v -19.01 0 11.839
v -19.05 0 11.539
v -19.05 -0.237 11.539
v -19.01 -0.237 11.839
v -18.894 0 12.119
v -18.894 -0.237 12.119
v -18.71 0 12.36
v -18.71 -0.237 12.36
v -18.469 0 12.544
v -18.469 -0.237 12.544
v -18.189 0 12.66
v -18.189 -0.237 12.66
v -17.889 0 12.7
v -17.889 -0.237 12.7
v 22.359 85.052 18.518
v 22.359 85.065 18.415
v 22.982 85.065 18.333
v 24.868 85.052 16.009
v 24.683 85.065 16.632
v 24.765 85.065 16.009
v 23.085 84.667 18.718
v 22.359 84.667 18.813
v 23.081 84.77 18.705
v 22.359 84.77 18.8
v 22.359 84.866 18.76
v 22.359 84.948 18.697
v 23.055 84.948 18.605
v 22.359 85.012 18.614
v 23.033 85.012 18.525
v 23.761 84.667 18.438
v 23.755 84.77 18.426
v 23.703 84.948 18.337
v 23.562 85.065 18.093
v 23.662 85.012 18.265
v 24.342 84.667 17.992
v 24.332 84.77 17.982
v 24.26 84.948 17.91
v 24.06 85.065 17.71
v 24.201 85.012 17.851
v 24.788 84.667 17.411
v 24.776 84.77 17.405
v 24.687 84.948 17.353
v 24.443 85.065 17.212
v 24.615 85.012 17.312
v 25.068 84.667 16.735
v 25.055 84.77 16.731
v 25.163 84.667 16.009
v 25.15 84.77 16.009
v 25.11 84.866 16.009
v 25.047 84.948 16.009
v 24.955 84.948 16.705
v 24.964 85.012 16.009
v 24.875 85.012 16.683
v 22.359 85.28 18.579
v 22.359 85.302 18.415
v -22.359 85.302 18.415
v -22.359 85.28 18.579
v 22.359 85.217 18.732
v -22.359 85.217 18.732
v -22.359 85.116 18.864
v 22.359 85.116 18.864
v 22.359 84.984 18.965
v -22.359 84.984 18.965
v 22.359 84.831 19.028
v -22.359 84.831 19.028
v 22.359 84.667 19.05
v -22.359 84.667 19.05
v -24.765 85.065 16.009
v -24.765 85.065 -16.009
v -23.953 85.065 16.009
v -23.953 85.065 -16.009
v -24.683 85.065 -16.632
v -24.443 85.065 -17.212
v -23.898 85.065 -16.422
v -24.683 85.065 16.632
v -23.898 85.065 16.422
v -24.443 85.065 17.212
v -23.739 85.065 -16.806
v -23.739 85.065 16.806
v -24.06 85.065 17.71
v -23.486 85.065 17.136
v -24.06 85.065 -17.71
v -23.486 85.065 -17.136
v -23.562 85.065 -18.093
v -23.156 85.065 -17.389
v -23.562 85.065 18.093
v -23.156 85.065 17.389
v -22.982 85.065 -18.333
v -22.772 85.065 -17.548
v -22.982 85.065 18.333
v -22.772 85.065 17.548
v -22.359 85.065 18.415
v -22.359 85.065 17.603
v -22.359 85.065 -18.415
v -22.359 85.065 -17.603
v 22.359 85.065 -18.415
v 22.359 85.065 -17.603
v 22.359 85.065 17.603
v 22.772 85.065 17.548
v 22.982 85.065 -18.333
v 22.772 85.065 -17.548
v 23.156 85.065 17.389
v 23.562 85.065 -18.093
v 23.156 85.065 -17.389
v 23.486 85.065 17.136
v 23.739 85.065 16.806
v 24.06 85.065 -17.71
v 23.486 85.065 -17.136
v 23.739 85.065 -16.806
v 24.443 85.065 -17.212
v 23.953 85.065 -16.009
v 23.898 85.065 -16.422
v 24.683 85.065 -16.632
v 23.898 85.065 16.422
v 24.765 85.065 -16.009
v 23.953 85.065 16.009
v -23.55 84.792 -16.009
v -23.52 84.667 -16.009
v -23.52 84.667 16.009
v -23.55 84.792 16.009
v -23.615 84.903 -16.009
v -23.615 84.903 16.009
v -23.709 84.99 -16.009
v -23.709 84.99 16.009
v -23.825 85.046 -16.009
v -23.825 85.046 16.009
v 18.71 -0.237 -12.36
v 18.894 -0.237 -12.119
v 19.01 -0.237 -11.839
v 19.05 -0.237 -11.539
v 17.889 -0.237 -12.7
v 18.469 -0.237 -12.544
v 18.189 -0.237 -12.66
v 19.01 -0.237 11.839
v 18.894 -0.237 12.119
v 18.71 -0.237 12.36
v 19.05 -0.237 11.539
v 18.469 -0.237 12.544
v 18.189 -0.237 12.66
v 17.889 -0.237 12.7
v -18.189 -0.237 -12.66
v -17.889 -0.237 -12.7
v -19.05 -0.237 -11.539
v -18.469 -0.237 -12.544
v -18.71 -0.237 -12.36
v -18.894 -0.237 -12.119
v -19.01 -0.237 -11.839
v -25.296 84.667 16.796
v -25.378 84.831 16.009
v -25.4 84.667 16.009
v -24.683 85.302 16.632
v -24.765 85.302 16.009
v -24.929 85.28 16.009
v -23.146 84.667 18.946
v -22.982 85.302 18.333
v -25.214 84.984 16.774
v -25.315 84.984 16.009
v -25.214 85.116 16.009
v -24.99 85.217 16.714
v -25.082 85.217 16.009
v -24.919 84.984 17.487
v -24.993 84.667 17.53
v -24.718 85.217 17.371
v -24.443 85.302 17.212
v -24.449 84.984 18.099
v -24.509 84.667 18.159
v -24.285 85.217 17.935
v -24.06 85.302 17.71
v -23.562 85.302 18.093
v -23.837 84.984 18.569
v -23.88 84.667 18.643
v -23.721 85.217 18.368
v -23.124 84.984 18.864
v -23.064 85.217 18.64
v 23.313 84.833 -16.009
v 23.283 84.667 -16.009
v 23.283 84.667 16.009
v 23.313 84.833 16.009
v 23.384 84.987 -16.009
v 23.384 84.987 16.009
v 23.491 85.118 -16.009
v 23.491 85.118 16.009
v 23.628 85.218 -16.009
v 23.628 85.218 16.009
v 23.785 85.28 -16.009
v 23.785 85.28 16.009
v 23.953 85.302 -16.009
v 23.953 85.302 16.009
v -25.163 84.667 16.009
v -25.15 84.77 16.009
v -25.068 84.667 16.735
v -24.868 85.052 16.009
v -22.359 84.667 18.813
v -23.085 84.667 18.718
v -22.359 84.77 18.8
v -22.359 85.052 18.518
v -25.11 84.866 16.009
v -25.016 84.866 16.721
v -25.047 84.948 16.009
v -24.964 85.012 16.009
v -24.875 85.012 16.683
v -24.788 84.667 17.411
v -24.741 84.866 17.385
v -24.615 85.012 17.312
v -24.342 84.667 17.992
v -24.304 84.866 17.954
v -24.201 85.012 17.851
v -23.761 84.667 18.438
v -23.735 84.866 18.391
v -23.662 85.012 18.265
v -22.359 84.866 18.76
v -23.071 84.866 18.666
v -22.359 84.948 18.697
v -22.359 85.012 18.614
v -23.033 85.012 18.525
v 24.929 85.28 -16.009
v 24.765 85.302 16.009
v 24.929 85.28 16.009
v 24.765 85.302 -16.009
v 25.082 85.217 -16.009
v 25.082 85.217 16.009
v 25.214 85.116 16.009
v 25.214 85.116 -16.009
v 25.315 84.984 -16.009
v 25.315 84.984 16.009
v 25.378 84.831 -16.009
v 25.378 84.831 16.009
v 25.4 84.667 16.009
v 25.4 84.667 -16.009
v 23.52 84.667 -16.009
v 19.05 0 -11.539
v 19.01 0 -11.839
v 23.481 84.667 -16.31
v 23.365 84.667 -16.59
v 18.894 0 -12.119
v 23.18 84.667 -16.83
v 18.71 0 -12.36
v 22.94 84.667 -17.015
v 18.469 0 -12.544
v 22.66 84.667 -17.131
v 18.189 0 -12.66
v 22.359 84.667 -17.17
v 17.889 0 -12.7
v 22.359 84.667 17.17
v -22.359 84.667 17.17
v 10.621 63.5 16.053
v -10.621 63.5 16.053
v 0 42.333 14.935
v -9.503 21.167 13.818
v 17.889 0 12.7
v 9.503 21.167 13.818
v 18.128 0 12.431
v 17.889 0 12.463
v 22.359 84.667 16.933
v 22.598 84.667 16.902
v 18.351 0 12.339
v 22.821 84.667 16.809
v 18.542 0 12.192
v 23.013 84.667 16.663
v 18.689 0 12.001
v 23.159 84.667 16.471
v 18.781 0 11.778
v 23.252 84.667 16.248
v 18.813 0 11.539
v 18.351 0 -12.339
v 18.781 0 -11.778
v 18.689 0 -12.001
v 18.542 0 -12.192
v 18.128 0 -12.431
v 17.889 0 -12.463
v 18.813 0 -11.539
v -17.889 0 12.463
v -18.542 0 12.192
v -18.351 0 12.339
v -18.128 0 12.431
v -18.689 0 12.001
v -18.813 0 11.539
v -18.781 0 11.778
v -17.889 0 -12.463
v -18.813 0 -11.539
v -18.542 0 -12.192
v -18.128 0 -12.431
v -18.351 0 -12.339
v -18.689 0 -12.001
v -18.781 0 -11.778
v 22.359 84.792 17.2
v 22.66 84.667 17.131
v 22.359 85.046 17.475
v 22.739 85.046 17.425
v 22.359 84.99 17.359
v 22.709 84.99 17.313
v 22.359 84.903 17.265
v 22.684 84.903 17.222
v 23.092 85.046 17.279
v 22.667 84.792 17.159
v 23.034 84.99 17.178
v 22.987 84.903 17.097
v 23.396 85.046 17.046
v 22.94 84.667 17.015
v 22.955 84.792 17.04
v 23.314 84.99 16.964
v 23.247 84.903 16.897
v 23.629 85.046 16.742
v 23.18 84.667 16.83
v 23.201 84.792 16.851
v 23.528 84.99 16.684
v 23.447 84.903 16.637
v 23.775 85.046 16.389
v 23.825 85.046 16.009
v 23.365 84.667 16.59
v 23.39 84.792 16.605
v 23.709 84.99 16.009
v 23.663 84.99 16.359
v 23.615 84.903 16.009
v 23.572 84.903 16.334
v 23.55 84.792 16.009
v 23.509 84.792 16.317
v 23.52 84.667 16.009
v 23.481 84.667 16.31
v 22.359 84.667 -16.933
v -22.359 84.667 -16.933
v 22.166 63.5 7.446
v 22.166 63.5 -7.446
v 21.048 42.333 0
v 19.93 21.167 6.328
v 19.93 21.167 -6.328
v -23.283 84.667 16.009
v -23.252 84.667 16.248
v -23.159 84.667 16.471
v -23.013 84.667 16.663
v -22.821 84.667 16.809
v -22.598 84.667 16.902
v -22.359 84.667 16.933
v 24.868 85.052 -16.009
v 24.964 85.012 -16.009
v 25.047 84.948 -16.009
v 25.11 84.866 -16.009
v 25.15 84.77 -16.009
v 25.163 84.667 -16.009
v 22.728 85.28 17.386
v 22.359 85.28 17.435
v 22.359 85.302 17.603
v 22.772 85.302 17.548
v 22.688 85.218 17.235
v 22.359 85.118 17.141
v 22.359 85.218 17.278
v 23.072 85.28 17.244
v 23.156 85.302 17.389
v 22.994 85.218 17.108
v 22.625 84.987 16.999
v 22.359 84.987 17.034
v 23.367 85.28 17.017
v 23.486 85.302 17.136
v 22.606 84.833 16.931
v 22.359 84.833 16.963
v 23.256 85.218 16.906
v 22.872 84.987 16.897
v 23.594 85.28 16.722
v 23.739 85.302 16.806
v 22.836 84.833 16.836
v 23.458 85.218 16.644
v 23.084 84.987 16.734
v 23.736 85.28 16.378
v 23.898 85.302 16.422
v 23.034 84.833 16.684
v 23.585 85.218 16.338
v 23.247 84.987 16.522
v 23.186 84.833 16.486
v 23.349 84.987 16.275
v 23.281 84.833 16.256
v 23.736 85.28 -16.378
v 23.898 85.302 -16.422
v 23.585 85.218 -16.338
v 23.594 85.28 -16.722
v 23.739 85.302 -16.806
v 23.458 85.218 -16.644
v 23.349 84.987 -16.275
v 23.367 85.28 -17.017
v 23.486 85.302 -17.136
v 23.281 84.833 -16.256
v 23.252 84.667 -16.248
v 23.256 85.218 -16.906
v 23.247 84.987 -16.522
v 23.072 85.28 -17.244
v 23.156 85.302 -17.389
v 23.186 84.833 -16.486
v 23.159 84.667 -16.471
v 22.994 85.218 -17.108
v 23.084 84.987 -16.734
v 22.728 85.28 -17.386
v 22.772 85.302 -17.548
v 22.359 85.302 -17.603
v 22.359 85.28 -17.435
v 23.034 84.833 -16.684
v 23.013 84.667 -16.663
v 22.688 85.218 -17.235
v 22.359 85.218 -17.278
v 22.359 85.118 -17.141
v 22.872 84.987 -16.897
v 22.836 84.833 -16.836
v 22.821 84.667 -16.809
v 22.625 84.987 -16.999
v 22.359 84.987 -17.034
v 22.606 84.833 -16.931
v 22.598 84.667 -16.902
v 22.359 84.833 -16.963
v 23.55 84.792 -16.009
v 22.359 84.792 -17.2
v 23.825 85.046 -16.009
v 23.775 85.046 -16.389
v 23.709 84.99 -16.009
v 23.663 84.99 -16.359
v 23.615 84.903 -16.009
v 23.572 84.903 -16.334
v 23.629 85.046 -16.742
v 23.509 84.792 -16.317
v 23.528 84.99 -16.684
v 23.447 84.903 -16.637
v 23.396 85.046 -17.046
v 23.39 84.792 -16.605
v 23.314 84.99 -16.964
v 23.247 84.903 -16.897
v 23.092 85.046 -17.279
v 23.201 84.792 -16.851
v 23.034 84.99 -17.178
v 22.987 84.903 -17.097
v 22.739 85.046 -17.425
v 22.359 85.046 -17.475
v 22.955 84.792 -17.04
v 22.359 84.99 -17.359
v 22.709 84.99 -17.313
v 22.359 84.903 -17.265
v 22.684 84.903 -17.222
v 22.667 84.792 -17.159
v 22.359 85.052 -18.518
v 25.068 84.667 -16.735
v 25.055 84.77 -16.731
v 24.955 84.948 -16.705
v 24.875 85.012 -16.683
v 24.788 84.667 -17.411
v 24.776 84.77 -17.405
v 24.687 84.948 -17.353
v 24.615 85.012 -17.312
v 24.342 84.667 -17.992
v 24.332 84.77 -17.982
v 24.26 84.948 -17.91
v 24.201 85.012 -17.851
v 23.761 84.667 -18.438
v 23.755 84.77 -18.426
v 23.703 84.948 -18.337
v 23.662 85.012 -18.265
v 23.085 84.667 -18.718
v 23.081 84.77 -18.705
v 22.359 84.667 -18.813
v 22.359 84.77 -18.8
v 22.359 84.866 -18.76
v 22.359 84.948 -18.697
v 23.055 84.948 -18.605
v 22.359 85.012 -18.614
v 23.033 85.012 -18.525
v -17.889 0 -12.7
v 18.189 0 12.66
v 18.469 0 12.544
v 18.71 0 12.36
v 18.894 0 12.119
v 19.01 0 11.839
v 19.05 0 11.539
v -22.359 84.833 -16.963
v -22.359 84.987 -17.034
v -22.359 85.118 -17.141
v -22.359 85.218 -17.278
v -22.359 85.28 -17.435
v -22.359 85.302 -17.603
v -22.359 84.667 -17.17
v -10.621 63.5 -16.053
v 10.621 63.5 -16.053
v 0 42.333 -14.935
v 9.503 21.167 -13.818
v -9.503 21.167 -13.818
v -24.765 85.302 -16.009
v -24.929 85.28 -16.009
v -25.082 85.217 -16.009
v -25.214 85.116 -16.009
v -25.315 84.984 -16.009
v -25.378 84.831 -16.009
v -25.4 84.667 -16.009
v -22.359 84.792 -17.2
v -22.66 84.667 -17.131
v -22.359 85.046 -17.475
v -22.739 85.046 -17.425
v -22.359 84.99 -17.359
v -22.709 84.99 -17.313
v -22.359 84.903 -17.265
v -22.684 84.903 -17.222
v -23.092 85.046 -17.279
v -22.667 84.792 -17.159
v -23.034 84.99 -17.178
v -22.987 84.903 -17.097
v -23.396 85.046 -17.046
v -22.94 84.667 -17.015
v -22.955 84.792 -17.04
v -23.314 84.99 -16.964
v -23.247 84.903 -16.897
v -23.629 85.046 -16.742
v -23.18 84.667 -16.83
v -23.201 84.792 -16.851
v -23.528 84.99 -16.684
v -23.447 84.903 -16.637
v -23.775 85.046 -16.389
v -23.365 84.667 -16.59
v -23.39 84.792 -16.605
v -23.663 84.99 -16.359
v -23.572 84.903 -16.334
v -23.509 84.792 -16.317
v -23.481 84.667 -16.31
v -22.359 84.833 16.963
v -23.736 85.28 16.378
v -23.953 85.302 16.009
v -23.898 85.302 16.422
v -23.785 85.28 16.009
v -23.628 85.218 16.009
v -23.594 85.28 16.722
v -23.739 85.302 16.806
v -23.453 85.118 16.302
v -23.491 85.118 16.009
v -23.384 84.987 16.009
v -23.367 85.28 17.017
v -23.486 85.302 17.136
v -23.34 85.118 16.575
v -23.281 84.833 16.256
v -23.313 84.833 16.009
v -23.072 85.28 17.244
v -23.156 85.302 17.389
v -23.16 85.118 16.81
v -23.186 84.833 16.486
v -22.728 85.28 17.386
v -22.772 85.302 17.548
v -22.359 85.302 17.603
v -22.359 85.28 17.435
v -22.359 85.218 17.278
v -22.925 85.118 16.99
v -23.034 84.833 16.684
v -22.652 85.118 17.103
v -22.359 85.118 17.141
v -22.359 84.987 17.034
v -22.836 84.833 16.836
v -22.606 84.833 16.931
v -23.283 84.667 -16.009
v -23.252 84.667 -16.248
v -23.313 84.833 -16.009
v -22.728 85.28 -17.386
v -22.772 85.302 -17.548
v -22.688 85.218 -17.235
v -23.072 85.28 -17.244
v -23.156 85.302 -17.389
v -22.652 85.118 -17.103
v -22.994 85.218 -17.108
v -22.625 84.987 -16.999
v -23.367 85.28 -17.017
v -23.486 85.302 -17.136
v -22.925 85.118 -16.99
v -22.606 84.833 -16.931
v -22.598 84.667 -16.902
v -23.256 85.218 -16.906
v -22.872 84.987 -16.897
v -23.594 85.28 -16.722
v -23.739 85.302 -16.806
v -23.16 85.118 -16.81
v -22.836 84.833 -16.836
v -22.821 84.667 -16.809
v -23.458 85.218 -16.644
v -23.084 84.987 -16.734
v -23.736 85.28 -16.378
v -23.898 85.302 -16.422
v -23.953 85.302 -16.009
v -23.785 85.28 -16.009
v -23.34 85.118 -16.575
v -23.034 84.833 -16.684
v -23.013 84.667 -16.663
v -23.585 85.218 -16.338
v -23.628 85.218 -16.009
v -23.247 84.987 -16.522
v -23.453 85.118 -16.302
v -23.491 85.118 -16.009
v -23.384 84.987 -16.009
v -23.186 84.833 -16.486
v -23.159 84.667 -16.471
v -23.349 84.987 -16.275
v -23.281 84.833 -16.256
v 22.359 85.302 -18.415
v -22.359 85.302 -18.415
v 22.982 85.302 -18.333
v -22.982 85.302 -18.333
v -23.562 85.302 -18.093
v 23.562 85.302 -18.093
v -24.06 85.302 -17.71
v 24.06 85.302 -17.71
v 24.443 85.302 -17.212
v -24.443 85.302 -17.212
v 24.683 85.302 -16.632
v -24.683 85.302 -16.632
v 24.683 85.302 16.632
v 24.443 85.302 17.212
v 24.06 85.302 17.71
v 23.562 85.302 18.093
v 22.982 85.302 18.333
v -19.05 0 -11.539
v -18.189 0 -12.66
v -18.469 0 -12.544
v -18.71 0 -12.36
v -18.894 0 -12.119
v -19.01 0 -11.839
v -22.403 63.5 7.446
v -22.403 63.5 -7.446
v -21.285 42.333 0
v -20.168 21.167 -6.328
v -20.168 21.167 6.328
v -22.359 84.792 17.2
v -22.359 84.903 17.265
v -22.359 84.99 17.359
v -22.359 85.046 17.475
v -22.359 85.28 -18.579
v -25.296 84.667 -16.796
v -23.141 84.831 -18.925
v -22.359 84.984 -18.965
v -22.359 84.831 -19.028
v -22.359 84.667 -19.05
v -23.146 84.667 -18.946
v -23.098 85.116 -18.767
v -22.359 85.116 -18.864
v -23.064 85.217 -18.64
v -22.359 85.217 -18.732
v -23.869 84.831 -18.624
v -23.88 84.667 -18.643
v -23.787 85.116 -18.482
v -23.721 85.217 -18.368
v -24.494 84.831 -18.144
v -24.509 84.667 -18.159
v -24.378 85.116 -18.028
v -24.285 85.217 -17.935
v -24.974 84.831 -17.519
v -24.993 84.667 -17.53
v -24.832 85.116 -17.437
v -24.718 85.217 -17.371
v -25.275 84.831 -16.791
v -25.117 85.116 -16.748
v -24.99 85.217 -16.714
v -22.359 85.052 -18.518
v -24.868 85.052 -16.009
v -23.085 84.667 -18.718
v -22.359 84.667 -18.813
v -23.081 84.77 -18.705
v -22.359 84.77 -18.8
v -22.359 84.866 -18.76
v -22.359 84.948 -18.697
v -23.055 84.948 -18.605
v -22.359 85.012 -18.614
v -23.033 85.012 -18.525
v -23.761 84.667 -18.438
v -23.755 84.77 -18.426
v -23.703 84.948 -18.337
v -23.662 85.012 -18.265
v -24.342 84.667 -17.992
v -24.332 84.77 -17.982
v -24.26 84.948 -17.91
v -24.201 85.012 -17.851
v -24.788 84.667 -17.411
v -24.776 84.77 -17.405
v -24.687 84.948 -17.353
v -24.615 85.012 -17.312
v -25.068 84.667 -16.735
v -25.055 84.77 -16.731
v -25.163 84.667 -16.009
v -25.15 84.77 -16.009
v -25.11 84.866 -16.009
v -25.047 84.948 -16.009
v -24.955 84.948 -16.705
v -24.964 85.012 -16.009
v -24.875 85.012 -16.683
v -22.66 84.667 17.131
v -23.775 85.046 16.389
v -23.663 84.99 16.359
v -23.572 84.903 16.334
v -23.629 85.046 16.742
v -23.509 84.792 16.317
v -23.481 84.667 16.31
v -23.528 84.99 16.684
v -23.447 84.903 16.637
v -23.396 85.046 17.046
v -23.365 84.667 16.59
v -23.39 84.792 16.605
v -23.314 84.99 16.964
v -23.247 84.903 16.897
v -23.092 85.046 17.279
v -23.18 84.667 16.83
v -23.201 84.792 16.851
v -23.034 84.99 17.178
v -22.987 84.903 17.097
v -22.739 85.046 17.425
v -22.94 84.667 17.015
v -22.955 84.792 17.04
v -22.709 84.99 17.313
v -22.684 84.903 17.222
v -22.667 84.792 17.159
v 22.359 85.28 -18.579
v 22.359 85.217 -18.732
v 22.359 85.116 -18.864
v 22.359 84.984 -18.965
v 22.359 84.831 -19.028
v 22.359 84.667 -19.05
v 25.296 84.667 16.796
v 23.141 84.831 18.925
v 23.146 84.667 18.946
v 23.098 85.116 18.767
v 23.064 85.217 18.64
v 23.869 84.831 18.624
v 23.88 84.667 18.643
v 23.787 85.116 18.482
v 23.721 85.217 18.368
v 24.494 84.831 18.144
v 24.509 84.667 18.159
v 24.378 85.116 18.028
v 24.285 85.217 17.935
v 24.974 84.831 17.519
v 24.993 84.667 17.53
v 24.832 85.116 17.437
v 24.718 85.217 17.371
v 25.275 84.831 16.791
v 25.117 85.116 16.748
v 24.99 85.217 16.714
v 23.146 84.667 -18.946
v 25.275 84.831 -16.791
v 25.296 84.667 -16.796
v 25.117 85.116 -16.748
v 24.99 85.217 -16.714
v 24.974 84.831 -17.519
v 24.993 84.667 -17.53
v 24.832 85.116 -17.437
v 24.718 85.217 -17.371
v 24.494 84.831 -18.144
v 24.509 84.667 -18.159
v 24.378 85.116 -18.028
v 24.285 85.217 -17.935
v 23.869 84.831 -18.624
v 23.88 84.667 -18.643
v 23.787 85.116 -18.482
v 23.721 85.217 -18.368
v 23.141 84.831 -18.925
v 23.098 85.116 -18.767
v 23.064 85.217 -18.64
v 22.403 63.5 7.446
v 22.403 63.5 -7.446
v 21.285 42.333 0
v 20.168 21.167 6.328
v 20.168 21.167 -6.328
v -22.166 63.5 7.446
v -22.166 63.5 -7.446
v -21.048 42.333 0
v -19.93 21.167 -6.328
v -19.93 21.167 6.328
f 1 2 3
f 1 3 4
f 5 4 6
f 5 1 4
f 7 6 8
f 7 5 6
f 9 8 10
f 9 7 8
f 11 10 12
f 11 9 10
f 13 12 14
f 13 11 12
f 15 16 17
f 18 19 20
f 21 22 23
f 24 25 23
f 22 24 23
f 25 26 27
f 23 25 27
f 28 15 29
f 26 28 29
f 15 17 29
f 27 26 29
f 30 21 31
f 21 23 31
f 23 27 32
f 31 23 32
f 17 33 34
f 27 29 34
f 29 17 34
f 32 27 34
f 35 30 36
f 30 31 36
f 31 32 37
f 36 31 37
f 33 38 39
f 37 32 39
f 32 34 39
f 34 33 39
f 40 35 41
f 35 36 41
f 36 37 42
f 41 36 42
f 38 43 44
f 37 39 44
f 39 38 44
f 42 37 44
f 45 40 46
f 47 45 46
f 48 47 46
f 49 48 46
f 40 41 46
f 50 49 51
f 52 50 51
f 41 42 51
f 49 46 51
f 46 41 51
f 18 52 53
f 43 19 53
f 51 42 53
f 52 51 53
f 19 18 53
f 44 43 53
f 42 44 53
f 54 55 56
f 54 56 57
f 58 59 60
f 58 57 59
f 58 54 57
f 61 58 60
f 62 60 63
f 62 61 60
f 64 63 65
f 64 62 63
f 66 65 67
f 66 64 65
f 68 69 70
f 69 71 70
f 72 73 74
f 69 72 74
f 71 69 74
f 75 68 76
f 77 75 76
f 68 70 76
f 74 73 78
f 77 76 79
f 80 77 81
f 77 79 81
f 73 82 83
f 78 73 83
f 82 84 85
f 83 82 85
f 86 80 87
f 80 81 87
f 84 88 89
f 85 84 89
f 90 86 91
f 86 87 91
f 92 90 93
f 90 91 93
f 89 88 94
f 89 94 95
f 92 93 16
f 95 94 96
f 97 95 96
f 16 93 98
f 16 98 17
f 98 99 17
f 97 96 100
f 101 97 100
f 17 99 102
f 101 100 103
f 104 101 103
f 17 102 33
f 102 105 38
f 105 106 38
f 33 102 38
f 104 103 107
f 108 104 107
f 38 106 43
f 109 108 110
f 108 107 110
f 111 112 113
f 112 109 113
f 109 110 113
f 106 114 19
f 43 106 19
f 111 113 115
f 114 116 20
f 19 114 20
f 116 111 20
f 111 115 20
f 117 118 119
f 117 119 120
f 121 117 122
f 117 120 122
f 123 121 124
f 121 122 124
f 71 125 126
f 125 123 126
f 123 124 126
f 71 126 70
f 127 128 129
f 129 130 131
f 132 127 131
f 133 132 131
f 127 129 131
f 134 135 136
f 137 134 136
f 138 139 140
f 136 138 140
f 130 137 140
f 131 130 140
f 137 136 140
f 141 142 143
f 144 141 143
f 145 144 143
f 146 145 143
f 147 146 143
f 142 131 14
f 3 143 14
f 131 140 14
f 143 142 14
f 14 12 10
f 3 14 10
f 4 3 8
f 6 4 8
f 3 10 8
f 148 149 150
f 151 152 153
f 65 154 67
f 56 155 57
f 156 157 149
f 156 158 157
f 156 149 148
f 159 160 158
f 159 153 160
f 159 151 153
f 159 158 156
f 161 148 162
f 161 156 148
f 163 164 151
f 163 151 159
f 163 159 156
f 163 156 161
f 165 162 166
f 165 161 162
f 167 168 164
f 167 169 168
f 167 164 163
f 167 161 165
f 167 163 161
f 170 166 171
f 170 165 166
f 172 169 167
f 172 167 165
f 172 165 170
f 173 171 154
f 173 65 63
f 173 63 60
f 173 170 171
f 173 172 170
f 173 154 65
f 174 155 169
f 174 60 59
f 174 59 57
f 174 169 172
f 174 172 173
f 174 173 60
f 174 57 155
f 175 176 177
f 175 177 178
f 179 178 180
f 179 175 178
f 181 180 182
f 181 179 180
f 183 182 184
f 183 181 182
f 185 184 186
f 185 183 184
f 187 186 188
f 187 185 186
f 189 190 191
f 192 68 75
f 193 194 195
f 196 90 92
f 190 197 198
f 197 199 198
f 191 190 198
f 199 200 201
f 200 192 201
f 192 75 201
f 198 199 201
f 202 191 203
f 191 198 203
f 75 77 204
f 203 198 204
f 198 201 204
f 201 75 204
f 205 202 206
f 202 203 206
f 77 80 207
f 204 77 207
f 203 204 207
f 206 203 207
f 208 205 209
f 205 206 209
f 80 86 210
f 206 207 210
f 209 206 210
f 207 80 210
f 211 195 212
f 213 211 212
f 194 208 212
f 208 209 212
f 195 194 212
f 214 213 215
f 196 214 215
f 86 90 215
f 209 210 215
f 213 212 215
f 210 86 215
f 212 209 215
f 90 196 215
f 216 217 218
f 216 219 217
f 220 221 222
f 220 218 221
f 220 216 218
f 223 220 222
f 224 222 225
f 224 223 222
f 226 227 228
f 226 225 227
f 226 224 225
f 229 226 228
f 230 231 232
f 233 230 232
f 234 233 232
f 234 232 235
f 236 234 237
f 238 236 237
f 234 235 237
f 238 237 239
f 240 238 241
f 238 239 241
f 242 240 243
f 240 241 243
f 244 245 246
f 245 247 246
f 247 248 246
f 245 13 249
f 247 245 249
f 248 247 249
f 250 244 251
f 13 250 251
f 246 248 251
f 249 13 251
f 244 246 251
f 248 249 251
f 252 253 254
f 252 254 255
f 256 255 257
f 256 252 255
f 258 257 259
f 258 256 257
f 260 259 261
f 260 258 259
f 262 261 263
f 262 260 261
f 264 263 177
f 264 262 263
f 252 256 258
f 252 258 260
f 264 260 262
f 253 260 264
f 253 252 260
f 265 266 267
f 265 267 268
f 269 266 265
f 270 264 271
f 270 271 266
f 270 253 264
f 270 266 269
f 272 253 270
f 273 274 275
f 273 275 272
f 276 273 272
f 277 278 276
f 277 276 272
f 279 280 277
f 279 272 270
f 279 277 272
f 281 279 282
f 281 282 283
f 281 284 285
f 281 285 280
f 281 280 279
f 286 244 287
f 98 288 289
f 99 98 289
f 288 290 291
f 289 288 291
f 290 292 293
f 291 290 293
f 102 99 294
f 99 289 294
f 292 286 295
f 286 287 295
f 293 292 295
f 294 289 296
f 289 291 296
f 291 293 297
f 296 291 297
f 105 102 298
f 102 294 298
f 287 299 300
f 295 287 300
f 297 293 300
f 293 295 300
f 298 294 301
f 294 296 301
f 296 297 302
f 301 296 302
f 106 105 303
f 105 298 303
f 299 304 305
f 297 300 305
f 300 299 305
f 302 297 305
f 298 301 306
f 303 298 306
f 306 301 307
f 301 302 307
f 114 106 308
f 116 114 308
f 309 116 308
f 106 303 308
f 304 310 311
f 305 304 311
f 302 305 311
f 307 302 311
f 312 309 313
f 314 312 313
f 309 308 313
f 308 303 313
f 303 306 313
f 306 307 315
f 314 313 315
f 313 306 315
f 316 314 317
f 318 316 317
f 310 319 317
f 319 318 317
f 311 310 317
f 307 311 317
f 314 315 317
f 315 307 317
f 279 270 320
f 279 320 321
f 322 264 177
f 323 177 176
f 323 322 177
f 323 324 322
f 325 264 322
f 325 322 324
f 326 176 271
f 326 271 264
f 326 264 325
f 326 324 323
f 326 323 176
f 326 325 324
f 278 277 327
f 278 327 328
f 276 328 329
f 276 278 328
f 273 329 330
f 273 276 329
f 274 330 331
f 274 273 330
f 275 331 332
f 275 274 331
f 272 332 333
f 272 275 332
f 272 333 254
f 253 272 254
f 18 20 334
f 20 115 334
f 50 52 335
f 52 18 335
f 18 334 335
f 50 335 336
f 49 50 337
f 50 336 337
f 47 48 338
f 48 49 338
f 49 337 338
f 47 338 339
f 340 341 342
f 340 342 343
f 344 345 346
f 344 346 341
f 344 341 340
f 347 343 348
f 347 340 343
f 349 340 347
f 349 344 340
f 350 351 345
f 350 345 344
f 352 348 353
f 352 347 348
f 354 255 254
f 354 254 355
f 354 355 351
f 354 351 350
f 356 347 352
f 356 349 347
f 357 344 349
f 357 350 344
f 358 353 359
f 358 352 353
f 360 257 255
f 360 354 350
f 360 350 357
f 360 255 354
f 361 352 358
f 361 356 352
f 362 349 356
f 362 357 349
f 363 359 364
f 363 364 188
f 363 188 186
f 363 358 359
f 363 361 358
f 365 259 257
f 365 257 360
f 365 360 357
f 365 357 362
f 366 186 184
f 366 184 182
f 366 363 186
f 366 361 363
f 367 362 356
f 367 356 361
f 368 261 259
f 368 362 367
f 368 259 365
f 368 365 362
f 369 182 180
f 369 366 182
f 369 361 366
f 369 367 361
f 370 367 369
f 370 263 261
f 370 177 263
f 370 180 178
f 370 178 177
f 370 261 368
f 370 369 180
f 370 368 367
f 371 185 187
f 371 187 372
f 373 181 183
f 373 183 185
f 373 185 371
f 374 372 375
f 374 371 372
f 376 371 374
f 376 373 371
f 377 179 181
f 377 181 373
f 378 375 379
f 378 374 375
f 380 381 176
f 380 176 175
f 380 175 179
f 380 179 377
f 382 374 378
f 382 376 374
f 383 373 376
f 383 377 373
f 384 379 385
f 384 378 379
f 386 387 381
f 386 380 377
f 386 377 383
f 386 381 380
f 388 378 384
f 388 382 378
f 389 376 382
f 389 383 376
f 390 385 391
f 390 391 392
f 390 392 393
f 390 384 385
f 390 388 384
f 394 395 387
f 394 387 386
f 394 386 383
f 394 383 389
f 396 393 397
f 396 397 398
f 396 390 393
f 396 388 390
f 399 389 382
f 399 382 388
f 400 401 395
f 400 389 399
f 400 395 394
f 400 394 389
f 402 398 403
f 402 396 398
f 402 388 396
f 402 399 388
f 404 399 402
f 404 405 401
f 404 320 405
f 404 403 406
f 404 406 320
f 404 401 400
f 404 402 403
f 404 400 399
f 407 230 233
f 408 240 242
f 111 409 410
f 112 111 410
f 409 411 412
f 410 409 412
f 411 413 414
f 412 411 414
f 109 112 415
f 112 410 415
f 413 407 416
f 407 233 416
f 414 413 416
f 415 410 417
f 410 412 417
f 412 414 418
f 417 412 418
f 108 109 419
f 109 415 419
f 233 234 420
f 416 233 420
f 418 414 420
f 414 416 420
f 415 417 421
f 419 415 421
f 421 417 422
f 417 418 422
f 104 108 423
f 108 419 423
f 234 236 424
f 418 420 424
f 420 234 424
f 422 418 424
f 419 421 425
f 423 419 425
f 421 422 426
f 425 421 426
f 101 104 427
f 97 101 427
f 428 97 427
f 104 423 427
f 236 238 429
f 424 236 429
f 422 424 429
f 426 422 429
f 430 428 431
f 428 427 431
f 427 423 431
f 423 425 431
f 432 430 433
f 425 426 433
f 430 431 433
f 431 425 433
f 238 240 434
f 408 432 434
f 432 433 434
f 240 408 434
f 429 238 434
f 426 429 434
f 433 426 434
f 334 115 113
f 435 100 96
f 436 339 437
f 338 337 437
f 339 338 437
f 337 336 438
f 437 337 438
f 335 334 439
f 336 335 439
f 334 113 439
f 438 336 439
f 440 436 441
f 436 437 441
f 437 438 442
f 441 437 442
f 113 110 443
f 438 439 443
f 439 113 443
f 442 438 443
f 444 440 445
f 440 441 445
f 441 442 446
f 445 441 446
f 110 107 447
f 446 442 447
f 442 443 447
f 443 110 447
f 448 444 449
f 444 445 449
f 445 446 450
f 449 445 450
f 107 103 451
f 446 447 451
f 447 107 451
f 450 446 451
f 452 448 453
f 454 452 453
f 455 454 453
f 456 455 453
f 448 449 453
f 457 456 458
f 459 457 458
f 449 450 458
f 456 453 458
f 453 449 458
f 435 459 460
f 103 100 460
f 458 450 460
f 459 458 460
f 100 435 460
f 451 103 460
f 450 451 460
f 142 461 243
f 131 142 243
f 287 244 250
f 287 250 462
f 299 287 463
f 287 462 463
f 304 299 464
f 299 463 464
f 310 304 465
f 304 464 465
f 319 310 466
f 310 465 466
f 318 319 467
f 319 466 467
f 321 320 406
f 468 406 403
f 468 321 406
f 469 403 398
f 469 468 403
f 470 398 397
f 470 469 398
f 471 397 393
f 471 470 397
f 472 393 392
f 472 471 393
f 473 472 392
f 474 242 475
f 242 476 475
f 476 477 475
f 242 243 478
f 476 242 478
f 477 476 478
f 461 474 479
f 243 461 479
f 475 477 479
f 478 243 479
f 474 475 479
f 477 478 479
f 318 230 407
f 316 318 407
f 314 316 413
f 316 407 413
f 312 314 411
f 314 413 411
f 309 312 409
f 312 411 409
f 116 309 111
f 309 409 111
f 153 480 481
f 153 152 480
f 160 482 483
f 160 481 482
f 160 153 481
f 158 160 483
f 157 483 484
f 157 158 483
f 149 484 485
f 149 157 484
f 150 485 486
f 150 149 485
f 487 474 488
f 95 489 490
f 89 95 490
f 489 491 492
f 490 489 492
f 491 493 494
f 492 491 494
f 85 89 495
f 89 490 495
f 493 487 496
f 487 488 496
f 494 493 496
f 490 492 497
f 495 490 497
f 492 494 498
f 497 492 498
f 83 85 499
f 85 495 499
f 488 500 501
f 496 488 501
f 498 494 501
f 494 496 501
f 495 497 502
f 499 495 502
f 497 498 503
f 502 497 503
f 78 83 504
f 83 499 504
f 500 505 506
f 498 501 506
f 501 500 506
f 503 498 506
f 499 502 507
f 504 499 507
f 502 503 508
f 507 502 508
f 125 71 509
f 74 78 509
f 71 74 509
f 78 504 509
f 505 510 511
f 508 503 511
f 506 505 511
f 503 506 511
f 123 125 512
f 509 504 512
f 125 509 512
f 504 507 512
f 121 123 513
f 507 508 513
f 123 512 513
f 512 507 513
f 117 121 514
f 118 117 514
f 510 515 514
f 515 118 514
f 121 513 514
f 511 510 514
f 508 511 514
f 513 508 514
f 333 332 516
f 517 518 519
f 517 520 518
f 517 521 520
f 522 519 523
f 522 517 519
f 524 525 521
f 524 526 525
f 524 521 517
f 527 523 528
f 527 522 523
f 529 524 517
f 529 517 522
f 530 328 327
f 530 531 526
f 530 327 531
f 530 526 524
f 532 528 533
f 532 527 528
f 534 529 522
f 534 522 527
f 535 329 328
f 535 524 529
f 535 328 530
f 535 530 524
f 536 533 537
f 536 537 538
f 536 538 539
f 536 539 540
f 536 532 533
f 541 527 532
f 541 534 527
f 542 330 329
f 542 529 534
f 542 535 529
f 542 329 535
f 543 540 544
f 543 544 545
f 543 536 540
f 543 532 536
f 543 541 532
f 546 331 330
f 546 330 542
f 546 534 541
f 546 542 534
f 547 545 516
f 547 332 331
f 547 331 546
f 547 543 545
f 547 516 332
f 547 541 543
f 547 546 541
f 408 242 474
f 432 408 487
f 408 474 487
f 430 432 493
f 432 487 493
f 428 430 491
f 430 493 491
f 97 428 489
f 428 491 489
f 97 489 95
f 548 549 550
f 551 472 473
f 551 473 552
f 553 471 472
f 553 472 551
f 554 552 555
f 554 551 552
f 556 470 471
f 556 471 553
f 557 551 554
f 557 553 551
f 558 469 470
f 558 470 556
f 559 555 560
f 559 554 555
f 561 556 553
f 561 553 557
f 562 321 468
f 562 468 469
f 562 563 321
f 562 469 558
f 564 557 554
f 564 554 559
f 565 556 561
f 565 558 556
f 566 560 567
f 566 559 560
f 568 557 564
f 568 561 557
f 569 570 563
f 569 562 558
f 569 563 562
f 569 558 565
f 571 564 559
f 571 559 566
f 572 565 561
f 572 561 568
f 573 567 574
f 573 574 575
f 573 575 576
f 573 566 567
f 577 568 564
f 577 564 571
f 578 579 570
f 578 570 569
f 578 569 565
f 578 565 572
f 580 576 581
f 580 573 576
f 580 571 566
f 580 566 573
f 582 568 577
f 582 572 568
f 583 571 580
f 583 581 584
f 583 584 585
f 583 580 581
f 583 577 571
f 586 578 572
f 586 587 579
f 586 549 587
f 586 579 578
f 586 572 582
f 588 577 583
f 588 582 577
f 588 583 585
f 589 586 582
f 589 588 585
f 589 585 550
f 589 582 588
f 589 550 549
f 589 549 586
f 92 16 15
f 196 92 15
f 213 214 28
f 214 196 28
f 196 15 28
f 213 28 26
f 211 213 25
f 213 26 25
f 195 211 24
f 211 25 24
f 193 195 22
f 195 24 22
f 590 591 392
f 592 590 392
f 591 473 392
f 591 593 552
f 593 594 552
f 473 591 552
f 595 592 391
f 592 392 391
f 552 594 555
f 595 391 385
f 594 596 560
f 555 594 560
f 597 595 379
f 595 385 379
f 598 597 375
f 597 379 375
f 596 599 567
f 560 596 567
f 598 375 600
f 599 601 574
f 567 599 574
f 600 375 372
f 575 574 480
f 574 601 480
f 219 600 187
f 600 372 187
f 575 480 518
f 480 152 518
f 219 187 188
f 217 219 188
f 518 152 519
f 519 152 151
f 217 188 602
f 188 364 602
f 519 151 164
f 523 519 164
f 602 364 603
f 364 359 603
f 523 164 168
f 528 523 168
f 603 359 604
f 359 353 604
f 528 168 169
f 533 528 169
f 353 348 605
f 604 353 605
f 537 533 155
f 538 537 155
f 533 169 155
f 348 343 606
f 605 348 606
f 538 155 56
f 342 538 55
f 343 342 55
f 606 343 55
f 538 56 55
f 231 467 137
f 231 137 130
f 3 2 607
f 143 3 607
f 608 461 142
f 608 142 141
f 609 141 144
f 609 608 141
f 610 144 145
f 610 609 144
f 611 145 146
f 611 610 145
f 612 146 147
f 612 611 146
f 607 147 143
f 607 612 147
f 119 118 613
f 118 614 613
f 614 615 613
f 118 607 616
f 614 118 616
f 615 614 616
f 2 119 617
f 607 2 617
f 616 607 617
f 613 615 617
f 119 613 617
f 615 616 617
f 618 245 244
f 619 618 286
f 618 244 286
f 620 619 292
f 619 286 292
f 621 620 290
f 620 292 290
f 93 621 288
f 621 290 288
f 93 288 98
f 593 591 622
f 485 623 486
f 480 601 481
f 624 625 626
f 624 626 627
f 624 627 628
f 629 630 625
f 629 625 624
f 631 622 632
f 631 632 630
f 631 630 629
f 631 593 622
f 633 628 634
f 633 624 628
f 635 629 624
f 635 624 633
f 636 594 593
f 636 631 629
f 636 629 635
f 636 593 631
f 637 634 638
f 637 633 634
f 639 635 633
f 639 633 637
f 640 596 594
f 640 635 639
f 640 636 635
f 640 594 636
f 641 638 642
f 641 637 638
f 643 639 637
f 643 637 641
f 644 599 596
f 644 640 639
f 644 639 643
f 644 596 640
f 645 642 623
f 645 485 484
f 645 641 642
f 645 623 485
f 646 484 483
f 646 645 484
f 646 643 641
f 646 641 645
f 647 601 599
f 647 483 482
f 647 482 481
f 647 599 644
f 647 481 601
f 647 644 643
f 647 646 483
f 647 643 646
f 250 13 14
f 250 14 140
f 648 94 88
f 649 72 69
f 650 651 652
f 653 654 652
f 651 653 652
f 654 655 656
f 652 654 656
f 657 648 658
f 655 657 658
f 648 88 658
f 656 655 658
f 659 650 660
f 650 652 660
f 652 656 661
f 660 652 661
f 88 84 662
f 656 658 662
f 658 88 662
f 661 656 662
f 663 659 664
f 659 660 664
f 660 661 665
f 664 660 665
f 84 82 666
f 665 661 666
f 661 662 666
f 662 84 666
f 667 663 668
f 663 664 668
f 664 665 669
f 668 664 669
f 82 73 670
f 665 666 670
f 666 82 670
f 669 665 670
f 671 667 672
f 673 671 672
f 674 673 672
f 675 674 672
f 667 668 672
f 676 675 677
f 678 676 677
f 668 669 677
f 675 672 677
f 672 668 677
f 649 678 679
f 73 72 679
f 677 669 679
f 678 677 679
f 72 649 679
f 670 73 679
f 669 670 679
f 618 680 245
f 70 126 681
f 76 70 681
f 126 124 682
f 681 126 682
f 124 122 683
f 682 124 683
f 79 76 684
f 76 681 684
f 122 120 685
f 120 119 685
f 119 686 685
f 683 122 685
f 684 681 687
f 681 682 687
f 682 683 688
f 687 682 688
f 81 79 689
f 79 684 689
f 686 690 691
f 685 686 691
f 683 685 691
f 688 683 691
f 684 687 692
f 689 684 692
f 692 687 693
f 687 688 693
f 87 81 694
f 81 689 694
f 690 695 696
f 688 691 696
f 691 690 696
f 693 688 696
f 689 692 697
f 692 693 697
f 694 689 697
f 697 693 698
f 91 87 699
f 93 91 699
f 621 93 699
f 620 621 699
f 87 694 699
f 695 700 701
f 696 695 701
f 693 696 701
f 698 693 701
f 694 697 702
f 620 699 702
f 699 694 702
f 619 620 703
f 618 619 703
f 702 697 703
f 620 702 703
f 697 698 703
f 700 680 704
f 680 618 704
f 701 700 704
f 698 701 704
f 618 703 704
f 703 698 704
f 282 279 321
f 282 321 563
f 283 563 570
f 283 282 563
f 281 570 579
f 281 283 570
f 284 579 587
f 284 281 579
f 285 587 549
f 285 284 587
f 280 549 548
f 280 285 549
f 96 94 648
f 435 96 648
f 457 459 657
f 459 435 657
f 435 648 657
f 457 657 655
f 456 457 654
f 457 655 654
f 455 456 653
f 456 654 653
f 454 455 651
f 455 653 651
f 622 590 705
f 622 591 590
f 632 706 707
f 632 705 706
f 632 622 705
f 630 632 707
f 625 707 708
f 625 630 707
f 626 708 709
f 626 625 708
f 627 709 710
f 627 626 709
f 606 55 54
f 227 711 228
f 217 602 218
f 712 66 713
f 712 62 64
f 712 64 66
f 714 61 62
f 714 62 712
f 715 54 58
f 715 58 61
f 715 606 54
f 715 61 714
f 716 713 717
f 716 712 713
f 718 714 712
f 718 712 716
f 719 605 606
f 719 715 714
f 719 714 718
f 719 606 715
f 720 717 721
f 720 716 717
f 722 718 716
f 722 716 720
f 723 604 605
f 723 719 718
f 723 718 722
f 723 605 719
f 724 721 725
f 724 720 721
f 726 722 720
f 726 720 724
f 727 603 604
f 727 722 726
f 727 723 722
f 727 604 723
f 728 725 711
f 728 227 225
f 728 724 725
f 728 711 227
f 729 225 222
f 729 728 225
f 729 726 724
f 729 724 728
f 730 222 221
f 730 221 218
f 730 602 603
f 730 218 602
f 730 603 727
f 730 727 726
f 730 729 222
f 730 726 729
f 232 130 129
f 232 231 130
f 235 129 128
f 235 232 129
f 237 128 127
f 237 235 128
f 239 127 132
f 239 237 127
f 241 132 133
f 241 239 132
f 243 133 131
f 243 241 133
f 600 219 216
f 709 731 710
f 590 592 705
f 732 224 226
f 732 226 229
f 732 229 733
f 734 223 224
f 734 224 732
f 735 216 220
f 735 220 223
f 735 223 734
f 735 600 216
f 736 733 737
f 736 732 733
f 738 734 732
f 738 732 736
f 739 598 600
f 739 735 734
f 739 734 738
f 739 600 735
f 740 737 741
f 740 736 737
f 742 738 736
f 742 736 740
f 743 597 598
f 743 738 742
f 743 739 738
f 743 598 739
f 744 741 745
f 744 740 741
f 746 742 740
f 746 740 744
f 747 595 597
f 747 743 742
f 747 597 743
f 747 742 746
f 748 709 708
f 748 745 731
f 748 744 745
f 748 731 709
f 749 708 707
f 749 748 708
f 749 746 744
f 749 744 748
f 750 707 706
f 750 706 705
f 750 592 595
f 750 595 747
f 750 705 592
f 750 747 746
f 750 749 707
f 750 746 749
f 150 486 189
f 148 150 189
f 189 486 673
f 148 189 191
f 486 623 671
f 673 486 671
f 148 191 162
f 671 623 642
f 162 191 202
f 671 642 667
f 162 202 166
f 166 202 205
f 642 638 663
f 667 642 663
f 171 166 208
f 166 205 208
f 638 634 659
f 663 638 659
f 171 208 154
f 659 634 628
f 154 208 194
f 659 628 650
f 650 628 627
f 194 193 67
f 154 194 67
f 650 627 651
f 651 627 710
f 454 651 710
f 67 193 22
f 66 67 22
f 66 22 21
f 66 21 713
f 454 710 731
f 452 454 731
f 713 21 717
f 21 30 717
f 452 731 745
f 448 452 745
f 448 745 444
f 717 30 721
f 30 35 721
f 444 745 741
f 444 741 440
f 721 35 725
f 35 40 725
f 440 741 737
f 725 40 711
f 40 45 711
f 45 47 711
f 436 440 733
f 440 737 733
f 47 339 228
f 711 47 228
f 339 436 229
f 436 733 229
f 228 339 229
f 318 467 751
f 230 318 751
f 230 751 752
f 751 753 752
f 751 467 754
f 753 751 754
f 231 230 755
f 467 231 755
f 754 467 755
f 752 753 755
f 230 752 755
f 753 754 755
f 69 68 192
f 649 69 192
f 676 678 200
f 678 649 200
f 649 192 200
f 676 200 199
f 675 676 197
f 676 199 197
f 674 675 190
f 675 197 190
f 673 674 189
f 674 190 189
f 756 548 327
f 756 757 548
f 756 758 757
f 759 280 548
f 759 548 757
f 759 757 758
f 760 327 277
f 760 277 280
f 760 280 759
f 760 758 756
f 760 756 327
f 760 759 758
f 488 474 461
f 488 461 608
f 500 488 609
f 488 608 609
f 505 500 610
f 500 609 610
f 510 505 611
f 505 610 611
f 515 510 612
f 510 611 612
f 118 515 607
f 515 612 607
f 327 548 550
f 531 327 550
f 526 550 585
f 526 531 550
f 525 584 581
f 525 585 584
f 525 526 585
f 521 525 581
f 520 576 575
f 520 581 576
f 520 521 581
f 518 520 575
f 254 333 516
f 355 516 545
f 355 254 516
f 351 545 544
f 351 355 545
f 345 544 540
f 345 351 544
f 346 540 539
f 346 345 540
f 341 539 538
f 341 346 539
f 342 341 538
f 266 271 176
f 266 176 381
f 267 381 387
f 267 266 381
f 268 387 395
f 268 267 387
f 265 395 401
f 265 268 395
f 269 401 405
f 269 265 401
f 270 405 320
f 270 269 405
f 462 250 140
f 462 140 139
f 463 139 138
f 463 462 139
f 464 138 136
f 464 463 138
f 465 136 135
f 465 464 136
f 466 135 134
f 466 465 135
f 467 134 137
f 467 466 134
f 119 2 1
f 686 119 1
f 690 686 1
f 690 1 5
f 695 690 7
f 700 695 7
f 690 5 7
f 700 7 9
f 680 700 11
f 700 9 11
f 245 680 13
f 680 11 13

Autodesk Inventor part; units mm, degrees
ref_plane "YZ Plane" through (0, 0, 0) normal (1, 0, 0) x (0, 1, 0)
ref_plane "XY Plane" through (0, 0, 0) normal (0, 0, 1) x (1, 0, 0)
sketch "Sketch1" plane through (0, 0, 0) normal (0, 1, 0) x (-1, 0, 0)
  line L0 (17.8888, -12.7) -> (0, -12.7)
  line L1 (0, 12.7) -> (17.8888, 12.7)
  line L2 (19.05, 11.5388) -> (19.05, -11.5388)
  arc A0 (17.8888, -12.7) -> (19.05, -11.5388) centre (17.8888, -11.5388) ccw
  line L3 (0, -12.7) -> (0, 12.7) construction
  arc A1 (19.05, 11.5388) -> (17.8888, 12.7) centre (17.8888, 11.5388) ccw
  line L4 (17.8888, -12.4629) -> (0, -12.4629)
  line L5 (0, 12.4629) -> (17.8888, 12.4629)
  line L6 (18.8129, 11.5388) -> (18.8129, -11.5388)
  arc A2 (17.8888, -12.4629) -> (18.8129, -11.5388) centre (17.8888, -11.5388) ccw
  arc A3 (18.8129, 11.5388) -> (17.8888, 12.4629) centre (17.8888, 11.5388) ccw
  line L7 (-17.8888, -12.7) -> (0, -12.7)
  line L8 (0, 12.7) -> (-17.8888, 12.7)
  line L9 (-19.05, 11.5388) -> (-19.05, -11.5388)
  arc A4 (-19.05, -11.5388) -> (-17.8888, -12.7) centre (-17.8888, -11.5388) ccw
  arc A5 (-17.8888, 12.7) -> (-19.05, 11.5388) centre (-17.8888, 11.5388) ccw
  line L10 (-17.8888, -12.4629) -> (0, -12.4629)
  line L11 (0, 12.4629) -> (-17.8888, 12.4629)
  line L12 (-18.8129, 11.5388) -> (-18.8129, -11.5388)
  arc A6 (-18.8129, -11.5388) -> (-17.8888, -12.4629) centre (-17.8888, -11.5388) ccw
  arc A7 (-17.8888, 12.4629) -> (-18.8129, 11.5388) centre (-17.8888, 11.5388) ccw
  point P0 (0, 0)
  point P1 (0, 0)
  dimension "d2" = 0.2371
  dimension "d3" = 0.2371
  dimension "d4" = 0.2371
  dimension "d6" = 19.05
  dimension "d7" = 25.4
  dimension "d17" = 0.9241
extrude "bottom of bin" add sketch "Sketch1" against normal blind 0.2371 contours L0 L7 A4 L9 A5 L8 L1 A1 L2 A0 | L4 L10 A6 L12 A7 L11 L5 A3 L6 A2
ref_plane "Work Plane1" through (0, 84.6667, 0) normal (0, 1, 0) x (-1, 0, 0)
sketch "Sketch2" plane through (0, 84.6667, 0) normal (0, 1, 0) x (-1, 0, 0)
  line L0 (0, -16.9333) -> (22.3592, -16.9333)
  line L1 (23.2833, -16.0092) -> (23.2833, 16.0092)
  line L2 (22.3592, 16.9333) -> (0, 16.9333)
  line L3 (17.8888, -12.7) -> (-17.8888, -12.7) projected
  line L4 (17.8888, 12.7) -> (-17.8888, 12.7) projected
  line L5 (19.05, -11.5388) -> (19.05, 11.5388) projected
  line L6 (0, -17.1704) -> (22.3592, -17.1704)
  line L7 (23.5204, -16.0092) -> (23.5204, 16.0092)
  line L8 (22.3592, 17.1704) -> (0, 17.1704)
  arc A0 (22.3592, -16.9333) -> (23.2833, -16.0092) centre (22.3592, -16.0092) ccw
  arc A1 (23.2833, 16.0092) -> (22.3592, 16.9333) centre (22.3592, 16.0092) ccw
  arc A2 (23.5204, 16.0092) -> (22.3592, 17.1704) centre (22.3592, 16.0092) ccw
  arc A3 (22.3592, -17.1704) -> (23.5204, -16.0092) centre (22.3592, -16.0092) ccw
  line L9 (0, -8.1161) -> (0, 0) construction
  line L10 (0, -16.9333) -> (-22.3592, -16.9333)
  line L11 (-23.2833, -16.0092) -> (-23.2833, 16.0092)
  line L12 (-22.3592, 16.9333) -> (0, 16.9333)
  line L13 (0, -17.1704) -> (-22.3592, -17.1704)
  line L14 (-23.5204, -16.0092) -> (-23.5204, 16.0092)
  line L15 (-22.3592, 17.1704) -> (0, 17.1704)
  arc A4 (-23.2833, -16.0092) -> (-22.3592, -16.9333) centre (-22.3592, -16.0092) ccw
  arc A5 (-22.3592, 16.9333) -> (-23.2833, 16.0092) centre (-22.3592, 16.0092) ccw
  arc A6 (-22.3592, 17.1704) -> (-23.5204, 16.0092) centre (-22.3592, 16.0092) ccw
  arc A7 (-23.5204, -16.0092) -> (-22.3592, -17.1704) centre (-22.3592, -16.0092) ccw
  point P0 (0, 0)
  dimension "d11" = 4.2333
  dimension "d12" = 4.2333
  dimension "d13" = 4.2333
  dimension "d14" = 0.2371
  dimension "d15" = 0.2371
  dimension "d16" = 0.2371
  dimension "d18" = 0.9241
  dimension "d19" = 0.9241
loft "loft make" add profiles "Sketch2", "Sketch1" contours L10 A4 L11 A5 L12 L2 A1 L1 A0 L0 | L13 A7 L14 A6 L15 L8 A2 L7 A3 L6 / L0 L7 A4 L9 A5 L8 L1 A1 L2 A0 | L4 L10 A6 L12 A7 L11 L5 A3 L6 A2
loft "loft cut" cut profiles "Sketch2", "Sketch1" contours L10 A4 L11 A5 L12 L2 A1 L1 A0 L0 / L4 L10 A6 L12 A7 L11 L5 A3 L6 A2
sketch "Sketch3" plane through (0, 0, 0) normal (1, 0, 0) x (0, 1, 0)
  line L0 (84.6667, 16.9333) -> (0, 12.4629) projected
  arc A0 (84.6667, 16.9333) -> (85.3017, 17.6027) centre (84.6313, 17.6027) ccw
  line L1 (85.3017, 17.6027) -> (85.3017, 18.415)
  arc A1 (84.6667, 17.1704) -> (85.0651, 17.6027) centre (84.6313, 17.6027) ccw
  arc A2 (85.3017, 18.415) -> (84.6667, 19.05) centre (84.6667, 18.415) ccw
  line L2 (84.6667, 19.05) -> (84.533, 19.05) construction
  line L3 (84.6667, 19.05) -> (84.6667, 18.8134)
  line L4 (85.0651, 17.6027) -> (85.0651, 18.415)
  arc A3 (85.0651, 18.415) -> (84.6667, 18.8134) centre (84.6667, 18.415) ccw
  line L5 (84.6667, 17.1704) -> (84.6667, 16.0092) projected
  line L6 (84.6667, 16.9333) -> (84.6667, 17.1704)
  point P0 (0, 0)
  dimension "d28" = 2.1167
  dimension "d29" = 0.635
sweep "lip rim" add profiles "Sketch3" path "Sketch2" path curves L8 A2 L7 A3 L6 L13 A7 L14 A6 L15
equation "\"d3\" = d2"
equation "\"d4\" = d2"
equation "\"d8\" = d2"
equation "\"d12\" = d11"
equation "\"d13\" = d11"
equation "\"d14\" = d2"
equation "\"d15\" = d2"
equation "\"d16\" = d2"
equation "\"d18\" = d17"
equation "\"d19\" = d17"
properties part number "recycle and trash bin"
